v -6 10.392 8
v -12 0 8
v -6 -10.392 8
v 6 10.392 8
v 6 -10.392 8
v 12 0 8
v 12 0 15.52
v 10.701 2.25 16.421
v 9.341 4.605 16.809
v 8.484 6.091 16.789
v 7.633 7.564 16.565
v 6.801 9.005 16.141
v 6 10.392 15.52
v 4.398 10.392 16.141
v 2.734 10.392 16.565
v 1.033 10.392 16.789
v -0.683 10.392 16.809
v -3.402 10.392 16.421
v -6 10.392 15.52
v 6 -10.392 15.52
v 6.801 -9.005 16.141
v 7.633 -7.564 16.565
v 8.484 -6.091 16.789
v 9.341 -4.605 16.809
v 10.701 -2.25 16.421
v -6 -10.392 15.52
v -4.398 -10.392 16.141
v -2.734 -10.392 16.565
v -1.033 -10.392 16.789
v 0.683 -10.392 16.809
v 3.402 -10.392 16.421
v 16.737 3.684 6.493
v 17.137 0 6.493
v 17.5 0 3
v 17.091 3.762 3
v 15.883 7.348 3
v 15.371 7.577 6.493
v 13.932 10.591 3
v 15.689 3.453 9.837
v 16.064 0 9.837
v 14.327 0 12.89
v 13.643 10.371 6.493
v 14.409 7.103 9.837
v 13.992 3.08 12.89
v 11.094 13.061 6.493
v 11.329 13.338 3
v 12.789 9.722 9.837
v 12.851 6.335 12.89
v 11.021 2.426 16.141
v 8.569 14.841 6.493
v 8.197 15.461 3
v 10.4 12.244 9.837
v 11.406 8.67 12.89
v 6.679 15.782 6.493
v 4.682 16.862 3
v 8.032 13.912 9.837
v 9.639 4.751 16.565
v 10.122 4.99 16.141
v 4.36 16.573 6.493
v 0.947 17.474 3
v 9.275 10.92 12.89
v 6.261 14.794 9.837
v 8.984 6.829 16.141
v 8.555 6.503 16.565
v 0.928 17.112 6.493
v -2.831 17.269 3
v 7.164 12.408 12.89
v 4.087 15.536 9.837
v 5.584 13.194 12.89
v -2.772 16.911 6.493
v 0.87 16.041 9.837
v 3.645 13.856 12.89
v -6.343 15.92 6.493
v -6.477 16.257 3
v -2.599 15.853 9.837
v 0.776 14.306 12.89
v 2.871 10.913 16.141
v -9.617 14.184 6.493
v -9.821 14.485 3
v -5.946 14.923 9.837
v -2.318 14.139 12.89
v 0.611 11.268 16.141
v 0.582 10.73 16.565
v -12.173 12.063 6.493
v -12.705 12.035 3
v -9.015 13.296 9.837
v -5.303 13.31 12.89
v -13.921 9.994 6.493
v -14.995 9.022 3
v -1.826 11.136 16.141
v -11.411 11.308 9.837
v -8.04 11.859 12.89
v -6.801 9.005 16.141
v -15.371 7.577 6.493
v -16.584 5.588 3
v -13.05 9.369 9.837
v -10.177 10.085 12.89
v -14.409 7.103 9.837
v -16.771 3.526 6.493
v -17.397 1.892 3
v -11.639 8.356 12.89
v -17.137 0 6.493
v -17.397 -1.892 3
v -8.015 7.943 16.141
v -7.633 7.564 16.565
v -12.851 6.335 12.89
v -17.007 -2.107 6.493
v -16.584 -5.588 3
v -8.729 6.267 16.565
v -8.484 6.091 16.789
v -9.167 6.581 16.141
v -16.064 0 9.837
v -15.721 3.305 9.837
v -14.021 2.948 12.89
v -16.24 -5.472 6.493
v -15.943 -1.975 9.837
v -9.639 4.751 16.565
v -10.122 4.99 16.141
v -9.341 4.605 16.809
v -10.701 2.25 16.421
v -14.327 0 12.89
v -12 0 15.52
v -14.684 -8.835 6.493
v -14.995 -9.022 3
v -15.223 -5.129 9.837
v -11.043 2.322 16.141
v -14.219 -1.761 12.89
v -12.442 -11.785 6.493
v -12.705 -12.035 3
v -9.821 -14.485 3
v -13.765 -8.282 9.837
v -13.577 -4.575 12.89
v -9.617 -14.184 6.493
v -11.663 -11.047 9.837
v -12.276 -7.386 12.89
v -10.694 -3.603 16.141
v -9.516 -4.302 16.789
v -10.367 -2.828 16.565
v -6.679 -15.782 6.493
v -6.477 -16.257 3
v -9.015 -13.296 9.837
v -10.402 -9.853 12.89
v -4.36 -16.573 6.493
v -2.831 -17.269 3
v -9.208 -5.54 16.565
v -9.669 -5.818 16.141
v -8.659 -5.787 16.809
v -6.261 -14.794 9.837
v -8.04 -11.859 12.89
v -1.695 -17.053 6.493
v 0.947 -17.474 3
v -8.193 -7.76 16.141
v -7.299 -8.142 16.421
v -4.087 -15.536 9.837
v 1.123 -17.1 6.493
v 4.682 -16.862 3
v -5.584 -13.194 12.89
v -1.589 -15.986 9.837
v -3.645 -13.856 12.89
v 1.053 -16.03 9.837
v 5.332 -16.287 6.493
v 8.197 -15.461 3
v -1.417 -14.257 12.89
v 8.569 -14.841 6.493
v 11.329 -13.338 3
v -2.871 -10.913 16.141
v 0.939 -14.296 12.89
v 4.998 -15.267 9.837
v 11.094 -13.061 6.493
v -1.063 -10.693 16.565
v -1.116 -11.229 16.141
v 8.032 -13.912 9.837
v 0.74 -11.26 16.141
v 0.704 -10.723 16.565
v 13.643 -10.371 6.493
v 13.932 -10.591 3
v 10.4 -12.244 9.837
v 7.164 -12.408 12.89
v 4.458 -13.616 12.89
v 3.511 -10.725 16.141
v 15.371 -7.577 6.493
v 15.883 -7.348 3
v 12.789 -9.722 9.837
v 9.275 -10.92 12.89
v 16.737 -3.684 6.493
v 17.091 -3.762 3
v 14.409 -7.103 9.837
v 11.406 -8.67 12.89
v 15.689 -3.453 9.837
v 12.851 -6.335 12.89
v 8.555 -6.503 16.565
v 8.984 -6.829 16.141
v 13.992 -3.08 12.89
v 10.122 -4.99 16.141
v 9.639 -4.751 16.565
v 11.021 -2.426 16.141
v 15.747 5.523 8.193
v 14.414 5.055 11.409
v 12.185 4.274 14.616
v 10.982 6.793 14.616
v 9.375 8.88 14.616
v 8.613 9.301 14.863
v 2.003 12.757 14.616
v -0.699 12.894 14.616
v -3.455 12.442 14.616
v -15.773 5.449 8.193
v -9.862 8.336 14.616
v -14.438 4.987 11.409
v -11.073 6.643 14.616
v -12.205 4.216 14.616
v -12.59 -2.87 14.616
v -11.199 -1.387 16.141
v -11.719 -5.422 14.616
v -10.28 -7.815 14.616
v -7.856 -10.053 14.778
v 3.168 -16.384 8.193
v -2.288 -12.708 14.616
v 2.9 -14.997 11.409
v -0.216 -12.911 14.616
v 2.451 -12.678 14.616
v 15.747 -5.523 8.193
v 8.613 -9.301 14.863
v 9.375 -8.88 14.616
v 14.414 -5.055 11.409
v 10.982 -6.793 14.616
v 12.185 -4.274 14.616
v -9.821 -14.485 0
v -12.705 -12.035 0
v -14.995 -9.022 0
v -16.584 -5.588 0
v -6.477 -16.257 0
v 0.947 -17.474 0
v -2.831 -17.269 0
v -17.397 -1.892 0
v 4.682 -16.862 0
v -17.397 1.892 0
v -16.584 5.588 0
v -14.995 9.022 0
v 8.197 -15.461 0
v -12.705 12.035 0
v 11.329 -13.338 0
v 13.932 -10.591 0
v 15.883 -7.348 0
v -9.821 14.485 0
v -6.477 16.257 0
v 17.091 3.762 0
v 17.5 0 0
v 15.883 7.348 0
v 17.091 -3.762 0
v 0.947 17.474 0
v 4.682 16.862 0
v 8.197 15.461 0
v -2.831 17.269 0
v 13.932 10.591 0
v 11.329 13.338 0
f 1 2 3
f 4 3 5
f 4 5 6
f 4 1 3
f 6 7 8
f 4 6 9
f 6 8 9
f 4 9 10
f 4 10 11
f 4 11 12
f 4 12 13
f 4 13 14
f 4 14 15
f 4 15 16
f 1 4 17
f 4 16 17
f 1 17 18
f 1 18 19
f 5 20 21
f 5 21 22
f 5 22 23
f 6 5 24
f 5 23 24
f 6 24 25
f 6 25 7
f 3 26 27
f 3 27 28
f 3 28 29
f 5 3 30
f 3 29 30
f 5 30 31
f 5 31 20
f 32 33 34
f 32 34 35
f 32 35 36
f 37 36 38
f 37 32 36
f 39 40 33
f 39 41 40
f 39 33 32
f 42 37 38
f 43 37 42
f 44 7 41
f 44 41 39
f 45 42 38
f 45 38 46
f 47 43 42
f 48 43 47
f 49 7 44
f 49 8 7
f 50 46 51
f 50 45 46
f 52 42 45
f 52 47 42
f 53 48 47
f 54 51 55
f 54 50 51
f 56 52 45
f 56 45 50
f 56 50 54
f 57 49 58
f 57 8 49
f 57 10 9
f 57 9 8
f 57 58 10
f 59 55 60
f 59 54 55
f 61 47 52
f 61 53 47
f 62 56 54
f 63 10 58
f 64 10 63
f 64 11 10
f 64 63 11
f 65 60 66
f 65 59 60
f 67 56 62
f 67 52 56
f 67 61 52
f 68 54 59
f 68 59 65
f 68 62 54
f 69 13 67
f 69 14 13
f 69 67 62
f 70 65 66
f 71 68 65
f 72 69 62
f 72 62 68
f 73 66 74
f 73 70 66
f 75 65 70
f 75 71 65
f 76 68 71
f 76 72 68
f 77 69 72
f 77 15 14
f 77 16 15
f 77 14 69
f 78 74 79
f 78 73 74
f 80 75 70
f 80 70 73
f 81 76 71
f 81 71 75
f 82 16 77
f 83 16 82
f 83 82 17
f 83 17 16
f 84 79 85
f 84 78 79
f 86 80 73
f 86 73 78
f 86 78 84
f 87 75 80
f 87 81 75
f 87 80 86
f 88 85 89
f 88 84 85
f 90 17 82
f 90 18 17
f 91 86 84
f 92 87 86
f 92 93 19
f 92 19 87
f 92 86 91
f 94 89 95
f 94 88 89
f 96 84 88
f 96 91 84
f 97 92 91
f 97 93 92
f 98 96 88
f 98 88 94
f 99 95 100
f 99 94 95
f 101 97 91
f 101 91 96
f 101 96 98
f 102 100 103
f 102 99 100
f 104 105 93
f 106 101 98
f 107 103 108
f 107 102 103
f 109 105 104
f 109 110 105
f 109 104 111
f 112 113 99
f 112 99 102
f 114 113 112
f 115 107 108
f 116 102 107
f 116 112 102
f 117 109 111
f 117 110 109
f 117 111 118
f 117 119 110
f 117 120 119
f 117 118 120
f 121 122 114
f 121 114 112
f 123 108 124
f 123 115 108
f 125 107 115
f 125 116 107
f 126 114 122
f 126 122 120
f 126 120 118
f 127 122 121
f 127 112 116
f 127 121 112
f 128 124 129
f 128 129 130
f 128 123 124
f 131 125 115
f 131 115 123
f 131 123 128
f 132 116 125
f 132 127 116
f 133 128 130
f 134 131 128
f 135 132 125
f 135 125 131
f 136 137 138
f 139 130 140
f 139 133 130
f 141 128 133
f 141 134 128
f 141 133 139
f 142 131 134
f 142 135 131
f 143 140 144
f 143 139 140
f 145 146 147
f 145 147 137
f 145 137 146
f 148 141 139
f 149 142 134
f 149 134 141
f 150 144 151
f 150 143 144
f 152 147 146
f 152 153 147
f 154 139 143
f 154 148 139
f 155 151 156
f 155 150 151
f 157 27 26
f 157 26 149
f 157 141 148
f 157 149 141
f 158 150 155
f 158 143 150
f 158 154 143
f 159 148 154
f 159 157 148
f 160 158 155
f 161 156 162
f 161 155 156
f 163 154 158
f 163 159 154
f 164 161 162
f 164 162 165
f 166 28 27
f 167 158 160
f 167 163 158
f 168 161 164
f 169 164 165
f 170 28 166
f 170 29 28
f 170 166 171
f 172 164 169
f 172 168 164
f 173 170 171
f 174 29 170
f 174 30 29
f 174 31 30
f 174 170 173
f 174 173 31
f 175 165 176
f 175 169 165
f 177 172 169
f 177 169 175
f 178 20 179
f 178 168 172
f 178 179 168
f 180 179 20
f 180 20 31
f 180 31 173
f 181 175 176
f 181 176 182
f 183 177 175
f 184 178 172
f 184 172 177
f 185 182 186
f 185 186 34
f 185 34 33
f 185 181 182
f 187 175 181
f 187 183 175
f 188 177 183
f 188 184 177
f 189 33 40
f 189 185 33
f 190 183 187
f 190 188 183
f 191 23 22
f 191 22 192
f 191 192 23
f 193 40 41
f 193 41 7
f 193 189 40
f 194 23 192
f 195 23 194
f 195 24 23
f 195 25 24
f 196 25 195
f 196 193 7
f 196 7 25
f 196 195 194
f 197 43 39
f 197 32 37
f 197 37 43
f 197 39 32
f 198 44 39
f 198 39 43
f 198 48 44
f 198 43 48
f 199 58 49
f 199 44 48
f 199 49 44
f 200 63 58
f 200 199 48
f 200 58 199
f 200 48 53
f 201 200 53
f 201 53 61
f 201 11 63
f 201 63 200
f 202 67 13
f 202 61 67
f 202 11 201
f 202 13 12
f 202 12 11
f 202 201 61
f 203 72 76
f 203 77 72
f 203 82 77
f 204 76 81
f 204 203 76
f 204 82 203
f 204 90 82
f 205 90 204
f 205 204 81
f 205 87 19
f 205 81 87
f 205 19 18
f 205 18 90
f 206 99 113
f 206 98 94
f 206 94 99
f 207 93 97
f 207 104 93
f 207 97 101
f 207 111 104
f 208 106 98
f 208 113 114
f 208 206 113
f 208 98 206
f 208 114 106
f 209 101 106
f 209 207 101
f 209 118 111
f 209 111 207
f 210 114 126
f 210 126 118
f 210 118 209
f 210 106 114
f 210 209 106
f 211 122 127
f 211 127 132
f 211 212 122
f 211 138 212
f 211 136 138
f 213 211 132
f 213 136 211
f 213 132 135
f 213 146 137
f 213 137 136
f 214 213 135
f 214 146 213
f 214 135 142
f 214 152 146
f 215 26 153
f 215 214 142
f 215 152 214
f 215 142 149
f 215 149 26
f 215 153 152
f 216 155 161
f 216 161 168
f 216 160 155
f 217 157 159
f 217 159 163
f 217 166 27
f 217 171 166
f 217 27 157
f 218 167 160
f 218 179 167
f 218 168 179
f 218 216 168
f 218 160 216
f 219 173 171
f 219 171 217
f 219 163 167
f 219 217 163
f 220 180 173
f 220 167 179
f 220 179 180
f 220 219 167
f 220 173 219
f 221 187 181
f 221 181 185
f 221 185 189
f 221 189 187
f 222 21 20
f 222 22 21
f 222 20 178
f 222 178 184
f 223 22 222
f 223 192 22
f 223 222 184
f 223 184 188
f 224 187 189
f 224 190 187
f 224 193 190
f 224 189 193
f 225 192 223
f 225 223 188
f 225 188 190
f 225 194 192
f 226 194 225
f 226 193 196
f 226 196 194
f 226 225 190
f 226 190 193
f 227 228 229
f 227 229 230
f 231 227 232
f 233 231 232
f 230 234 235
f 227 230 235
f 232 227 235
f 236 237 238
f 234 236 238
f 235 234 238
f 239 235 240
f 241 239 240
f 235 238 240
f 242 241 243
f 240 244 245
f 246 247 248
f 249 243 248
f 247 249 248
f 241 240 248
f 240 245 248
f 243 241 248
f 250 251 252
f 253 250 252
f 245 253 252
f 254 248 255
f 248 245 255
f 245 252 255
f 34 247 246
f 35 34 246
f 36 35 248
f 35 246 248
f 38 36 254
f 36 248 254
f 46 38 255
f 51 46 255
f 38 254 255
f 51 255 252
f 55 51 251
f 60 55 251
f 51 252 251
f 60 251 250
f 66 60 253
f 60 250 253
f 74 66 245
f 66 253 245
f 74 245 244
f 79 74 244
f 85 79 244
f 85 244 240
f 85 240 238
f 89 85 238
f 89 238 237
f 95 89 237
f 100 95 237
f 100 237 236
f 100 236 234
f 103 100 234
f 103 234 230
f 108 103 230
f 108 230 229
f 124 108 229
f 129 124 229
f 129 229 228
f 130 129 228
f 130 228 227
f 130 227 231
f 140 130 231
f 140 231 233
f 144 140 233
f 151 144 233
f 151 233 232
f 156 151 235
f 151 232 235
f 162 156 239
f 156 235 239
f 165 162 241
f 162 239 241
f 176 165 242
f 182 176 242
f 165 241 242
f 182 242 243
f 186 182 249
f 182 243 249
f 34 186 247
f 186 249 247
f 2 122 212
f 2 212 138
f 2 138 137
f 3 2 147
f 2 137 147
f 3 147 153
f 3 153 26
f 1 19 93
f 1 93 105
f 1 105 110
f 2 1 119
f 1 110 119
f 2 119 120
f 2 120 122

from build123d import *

# Parameters (mm, degrees)
F0_R     = 17.5
F1_DEPTH = 20
F3_DEPTH = 12


# Not quite as in the source:
# - a fillet or chamfer that OpenCascade refuses, or shapes differently, is made with other operations: its cross-section is extruded or revolved along the edge and cut away or added


with BuildPart() as f1:
    # F0 (on Top) → F1 (new body)
    with BuildSketch(Plane.XY):
        Circle(F0_R)
    extrude(amount=F1_DEPTH)

    # F2 (on face) → F3 (cut)
    with BuildSketch(Plane.XY.offset(20)):
        Polygon((6, 10.3923048454), (-6, 10.3923048454), (-12, 0), (-6, -10.3923048454), (6, -10.3923048454), (12, 0), align=None)
    extrude(amount=-F3_DEPTH, mode=Mode.SUBTRACT)

    # F4: fillet of radius 17 on 1 edges, made by hand

    # F4_s1 → F4_t2 (revolve, cut)
    with BuildSketch(Plane.XZ):
        with BuildLine():
            ThreePointArc((17.5, 3), (12.5208152802, 15.0208152802), (0.5, 20))
            Line((0.5, 20), (17.5, 20))
            Line((17.5, 20), (17.5, 3))
        make_face()
    revolve(axis=Axis((0, 0, 20), (0, 0, 1)), mode=Mode.SUBTRACT)


solid = f1.part
